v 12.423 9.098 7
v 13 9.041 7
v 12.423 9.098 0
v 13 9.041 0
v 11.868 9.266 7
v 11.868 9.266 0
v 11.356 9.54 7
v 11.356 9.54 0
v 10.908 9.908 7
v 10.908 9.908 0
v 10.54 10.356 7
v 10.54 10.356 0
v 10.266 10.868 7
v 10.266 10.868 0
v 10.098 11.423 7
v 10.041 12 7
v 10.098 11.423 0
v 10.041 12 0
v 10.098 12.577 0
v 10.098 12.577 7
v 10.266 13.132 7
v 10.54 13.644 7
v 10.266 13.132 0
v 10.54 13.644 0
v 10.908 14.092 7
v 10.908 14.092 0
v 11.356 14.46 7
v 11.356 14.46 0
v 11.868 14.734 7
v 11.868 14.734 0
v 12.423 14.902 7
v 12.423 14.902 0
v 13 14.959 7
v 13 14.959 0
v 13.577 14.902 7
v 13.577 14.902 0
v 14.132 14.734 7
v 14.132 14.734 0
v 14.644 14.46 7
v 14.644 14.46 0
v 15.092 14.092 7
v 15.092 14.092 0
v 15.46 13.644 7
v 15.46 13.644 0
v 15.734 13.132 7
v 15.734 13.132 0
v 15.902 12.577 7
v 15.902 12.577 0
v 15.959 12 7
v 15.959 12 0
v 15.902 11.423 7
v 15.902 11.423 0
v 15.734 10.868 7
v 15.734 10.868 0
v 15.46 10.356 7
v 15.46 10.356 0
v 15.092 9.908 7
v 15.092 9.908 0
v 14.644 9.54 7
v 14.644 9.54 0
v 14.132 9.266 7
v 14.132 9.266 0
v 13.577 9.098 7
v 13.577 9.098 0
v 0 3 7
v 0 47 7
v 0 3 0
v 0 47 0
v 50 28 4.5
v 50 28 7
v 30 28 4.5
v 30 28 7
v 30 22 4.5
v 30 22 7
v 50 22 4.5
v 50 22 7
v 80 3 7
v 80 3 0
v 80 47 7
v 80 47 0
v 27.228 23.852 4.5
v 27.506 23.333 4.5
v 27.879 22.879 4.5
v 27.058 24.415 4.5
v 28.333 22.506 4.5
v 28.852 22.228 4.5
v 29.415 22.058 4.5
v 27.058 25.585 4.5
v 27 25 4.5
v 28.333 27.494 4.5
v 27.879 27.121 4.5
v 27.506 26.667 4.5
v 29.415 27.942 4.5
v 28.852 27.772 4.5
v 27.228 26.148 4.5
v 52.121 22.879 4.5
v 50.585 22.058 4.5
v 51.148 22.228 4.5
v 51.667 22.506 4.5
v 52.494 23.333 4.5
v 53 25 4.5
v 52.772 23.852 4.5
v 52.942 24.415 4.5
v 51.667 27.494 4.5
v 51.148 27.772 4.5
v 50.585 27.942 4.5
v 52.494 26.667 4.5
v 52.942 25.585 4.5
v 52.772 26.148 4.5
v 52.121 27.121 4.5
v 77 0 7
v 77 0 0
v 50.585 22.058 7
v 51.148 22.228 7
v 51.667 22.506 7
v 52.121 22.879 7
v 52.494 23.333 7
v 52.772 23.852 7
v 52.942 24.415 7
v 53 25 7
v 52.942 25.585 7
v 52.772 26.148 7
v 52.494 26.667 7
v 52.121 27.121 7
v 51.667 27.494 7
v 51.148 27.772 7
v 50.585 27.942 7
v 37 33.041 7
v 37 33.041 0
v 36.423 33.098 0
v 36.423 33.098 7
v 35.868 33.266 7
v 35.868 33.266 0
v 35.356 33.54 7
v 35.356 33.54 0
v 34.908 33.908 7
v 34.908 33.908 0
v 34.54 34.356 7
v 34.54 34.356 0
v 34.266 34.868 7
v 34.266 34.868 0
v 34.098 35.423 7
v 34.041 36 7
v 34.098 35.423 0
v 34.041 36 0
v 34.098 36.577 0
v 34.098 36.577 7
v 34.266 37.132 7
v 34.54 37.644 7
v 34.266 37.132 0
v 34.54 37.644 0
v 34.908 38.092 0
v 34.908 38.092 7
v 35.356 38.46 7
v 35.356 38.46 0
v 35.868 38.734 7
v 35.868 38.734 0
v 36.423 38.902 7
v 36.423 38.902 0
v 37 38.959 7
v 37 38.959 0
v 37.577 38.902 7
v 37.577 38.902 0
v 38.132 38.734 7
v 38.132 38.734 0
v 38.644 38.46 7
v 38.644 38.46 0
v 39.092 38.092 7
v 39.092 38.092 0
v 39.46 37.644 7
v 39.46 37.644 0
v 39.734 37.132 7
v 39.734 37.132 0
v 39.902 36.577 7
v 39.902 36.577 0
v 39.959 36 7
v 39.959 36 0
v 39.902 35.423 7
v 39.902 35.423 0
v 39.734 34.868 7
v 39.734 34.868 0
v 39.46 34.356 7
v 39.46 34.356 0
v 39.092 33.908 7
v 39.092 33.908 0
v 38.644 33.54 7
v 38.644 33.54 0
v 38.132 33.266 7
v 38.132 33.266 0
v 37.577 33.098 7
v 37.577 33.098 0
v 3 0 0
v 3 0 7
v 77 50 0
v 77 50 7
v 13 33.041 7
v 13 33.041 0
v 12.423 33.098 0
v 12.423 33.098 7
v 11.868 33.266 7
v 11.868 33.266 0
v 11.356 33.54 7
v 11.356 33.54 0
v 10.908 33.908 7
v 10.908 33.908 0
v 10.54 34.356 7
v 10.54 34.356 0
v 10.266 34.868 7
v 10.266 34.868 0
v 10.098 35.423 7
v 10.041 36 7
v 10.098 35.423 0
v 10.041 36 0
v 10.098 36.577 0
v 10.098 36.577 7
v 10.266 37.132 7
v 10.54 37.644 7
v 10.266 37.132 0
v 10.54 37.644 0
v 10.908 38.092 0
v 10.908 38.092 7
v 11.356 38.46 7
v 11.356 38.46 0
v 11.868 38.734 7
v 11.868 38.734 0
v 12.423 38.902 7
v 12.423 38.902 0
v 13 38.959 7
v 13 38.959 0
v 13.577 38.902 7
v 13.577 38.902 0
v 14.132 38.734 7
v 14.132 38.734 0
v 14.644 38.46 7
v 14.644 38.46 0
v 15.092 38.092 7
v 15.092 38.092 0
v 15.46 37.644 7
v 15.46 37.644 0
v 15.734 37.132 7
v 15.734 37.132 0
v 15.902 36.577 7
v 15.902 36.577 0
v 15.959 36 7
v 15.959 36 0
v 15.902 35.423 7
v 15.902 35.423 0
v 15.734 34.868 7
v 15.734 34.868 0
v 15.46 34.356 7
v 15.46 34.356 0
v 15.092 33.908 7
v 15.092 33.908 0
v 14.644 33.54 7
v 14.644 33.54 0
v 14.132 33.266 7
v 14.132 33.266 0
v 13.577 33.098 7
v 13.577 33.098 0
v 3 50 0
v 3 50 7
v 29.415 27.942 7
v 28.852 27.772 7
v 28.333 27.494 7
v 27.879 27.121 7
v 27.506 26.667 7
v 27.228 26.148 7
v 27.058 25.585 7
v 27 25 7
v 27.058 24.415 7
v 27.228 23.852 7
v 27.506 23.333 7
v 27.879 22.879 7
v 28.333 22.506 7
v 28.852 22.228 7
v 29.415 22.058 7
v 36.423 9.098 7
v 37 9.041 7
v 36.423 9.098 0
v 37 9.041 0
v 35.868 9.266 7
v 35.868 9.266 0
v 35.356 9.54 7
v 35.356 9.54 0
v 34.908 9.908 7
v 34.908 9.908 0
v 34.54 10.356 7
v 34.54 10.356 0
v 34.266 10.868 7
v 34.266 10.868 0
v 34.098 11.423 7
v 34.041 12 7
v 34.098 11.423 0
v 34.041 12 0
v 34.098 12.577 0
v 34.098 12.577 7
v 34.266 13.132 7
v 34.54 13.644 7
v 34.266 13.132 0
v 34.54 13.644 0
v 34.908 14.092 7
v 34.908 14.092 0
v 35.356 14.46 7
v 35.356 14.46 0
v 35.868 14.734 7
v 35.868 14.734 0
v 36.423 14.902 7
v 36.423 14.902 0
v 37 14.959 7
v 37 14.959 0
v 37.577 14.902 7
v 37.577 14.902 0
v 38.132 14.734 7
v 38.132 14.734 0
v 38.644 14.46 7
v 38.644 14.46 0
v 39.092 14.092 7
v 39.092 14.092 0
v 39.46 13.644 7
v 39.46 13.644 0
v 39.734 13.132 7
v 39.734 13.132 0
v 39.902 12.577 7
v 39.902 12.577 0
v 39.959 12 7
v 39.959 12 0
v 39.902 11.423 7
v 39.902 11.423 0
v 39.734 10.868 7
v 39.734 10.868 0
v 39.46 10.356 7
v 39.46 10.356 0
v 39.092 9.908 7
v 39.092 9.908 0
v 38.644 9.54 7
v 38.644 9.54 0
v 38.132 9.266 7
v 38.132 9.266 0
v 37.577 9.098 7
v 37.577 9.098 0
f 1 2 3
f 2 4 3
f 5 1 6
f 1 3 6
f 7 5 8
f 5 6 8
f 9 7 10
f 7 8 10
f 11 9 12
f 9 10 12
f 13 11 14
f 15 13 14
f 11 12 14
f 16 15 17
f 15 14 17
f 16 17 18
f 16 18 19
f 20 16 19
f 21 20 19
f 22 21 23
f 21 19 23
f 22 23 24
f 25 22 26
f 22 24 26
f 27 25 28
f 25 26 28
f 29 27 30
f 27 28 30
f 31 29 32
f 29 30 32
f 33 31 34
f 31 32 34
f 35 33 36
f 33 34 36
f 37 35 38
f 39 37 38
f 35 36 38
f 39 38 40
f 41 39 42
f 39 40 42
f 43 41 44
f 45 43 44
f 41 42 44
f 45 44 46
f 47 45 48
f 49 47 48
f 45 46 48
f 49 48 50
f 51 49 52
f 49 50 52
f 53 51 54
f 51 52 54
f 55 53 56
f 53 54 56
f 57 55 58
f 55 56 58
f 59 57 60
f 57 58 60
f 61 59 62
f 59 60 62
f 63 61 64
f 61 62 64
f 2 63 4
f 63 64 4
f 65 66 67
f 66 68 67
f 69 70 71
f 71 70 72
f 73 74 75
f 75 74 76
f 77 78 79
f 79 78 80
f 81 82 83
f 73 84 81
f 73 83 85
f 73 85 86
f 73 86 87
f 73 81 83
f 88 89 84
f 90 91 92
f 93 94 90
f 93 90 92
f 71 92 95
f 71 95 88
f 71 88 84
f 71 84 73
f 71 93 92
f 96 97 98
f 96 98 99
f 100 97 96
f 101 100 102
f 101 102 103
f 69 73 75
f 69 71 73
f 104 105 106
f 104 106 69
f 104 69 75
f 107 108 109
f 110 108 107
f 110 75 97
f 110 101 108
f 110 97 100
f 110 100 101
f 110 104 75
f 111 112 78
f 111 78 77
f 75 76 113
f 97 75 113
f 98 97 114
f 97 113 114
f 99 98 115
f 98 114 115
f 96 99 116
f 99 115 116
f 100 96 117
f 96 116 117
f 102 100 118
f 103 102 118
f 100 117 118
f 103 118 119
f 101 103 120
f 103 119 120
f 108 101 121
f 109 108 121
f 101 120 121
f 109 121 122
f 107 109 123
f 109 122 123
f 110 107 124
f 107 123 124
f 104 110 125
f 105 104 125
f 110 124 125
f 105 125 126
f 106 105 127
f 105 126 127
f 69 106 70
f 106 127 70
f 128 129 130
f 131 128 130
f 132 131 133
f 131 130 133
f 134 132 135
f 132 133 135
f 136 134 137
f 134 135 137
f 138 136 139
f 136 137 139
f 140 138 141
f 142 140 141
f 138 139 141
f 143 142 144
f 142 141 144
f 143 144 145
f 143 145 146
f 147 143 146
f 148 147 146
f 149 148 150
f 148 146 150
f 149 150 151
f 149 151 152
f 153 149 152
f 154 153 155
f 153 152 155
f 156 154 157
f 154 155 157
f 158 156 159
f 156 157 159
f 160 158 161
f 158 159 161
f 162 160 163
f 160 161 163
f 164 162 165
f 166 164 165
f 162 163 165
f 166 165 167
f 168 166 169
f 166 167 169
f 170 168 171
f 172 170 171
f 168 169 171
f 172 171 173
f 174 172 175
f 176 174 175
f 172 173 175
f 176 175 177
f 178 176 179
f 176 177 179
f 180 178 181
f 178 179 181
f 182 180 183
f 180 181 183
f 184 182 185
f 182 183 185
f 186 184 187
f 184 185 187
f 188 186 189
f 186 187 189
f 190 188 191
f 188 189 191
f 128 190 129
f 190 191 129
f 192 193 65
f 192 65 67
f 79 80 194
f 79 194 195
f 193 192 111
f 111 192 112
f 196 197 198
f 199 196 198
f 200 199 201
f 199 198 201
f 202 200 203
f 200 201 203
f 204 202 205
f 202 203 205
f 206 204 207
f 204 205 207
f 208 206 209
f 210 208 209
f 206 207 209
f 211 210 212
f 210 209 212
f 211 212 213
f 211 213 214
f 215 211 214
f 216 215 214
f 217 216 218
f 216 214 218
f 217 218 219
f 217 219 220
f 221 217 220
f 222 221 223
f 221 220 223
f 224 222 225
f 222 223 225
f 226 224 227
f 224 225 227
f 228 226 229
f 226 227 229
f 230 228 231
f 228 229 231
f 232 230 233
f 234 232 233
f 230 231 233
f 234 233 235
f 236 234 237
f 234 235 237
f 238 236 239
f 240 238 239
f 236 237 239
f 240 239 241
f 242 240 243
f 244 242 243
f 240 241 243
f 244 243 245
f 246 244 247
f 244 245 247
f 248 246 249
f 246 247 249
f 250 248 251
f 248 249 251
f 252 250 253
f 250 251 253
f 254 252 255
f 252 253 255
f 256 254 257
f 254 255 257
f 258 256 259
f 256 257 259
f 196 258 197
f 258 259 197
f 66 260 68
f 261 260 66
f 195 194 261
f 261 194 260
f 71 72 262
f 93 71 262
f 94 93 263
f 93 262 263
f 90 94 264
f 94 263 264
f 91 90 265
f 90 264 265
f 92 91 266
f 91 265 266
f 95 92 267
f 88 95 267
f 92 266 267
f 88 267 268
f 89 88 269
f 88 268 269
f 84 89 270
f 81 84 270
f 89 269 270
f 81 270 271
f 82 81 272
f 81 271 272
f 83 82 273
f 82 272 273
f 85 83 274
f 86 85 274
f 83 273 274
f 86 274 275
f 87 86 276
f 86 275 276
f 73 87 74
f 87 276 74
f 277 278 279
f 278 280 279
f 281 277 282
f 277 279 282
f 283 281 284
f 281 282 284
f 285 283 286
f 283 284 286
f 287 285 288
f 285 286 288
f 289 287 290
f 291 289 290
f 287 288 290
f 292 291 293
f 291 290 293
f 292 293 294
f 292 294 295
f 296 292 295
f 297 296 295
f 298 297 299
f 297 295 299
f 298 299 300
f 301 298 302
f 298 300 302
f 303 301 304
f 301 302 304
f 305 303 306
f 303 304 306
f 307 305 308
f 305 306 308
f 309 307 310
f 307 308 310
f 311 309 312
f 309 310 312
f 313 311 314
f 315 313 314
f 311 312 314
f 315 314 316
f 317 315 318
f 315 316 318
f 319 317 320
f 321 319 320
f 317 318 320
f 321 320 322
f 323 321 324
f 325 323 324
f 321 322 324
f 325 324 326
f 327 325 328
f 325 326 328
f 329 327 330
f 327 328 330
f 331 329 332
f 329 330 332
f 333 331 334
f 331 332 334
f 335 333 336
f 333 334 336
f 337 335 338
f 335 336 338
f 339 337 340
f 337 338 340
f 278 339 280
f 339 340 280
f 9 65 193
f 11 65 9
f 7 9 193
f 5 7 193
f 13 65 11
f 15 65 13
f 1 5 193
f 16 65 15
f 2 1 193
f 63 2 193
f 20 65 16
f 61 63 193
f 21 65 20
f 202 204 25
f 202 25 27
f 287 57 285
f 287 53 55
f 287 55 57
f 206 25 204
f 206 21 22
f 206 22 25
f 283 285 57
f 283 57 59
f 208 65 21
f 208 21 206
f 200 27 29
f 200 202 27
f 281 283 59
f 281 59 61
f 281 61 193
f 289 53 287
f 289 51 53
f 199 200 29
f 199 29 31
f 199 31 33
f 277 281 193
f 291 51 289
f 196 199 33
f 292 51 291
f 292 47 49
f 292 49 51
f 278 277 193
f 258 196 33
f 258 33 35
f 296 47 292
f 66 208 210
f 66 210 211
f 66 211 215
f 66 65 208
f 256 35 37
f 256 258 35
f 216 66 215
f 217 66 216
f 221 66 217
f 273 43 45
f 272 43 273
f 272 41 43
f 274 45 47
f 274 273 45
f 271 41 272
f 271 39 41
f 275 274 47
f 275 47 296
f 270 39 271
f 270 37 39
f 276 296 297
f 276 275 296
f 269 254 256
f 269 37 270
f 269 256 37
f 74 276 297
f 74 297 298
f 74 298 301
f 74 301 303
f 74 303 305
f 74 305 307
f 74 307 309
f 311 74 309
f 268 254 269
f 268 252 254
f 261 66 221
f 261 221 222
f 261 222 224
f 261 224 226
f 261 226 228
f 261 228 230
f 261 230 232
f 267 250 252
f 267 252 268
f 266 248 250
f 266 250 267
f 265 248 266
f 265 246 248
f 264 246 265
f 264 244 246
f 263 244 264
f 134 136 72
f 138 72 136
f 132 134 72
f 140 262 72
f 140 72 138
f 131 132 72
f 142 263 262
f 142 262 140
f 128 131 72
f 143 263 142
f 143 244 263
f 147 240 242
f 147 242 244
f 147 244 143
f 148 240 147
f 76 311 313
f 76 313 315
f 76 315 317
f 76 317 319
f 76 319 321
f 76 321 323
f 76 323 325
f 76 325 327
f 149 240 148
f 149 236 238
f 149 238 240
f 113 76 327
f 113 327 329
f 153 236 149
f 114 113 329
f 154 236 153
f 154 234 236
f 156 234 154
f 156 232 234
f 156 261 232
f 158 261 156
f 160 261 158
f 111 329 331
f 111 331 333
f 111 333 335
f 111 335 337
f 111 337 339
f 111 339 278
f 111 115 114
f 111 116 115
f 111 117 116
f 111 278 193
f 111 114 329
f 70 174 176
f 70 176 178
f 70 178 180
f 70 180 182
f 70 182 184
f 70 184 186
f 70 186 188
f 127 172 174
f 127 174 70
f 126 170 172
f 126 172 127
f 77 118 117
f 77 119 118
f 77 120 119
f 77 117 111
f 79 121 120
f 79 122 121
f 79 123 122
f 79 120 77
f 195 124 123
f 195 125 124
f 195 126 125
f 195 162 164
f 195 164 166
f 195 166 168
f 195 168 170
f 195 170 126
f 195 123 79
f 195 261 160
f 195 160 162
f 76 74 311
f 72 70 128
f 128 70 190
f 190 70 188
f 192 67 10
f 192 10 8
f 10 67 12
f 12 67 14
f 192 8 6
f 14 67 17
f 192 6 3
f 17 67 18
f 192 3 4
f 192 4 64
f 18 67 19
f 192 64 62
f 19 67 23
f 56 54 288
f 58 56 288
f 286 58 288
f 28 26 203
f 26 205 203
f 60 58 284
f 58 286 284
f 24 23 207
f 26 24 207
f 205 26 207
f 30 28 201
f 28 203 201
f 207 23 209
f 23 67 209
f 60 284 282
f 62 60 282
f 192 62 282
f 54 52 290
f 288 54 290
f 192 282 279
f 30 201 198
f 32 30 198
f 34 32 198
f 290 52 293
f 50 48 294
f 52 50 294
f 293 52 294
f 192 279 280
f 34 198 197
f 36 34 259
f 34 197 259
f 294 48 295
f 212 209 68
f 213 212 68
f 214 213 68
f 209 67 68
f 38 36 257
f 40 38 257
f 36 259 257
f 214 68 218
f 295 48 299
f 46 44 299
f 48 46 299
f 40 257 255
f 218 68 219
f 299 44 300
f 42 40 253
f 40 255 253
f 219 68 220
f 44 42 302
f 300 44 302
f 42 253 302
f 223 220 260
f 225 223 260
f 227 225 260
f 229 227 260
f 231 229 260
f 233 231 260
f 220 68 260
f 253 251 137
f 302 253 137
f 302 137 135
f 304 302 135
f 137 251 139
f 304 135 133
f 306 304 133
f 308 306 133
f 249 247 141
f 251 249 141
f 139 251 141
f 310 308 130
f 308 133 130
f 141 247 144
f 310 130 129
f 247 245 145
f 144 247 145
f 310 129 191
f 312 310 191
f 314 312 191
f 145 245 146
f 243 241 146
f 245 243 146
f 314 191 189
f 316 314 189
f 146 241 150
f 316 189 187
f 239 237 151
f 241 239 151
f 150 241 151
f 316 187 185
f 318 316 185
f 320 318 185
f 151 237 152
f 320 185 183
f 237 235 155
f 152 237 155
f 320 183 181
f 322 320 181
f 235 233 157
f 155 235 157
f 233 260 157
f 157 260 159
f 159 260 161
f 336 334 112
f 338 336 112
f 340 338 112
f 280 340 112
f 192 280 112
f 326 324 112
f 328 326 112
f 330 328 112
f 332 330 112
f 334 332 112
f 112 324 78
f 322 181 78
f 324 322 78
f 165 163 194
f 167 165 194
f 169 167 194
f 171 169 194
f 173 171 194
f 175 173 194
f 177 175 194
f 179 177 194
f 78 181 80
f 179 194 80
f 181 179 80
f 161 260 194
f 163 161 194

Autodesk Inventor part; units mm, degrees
ref_plane "YZ Plane" through (0, 0, 0) normal (1, 0, 0) x (0, 1, 0)
ref_plane "XZ Plane" through (0, 0, 0) normal (0, 1, 0) x (-1, 0, 0)
ref_plane "XY Plane" through (0, 0, 0) normal (0, 0, 1) x (1, 0, 0)
sketch "Skizze1" plane through (0, 0, 0) normal (0, 0, 1) x (1, 0, 0)
  line L0 (0, 0) -> (80, 0)
  line L1 (80, 0) -> (80, 50)
  line L2 (80, 50) -> (0, 50)
  line L3 (0, 50) -> (0, 0)
  dimension "Breite" = 50
  dimension "Laenge" = 80
extrude "Extrusion1" add sketch "Skizze1" along normal blind 7
chamfer "Fasen1" distance 3 angle 45 4 edges at (80, 50, 3.5) (80, 0, 3.5) (0, 50, 3.5) (0, 0, 3.5)
sketch "Skizze2" plane through (0, 0, 7) normal (0, 0, 1) x (1, 0, 0)
  line L0 (77, 50) -> (3, 50) projected
  line L1 (40, 50) -> (40, 0) construction
  line L2 (0, 47) -> (0, 3) projected
  line L3 (0, 25) -> (80, 25) construction
  line L4 (80, 3) -> (80, 47) projected
  point P0 (0, 0)
  point P1 (13, 36)
  dimension "Punktabstand1" = 13
  dimension "Punktabstand2" = 14
hole "Bohrung1" at (13, 36, 7) direction (0, 0, -1) diameter 5.9175 end through all thread size "M7x1" class "6H" standard "ISO Metric profile"
sketch "Skizze3" plane through (0, 0, 7) normal (0, 0, 1) x (1, 0, 0)
  line L0 (30, 25) -> (50, 25) construction
  line L1 (30, 22) -> (50, 22)
  line L2 (50, 28) -> (30, 28)
  arc A0 (30, 28) -> (30, 22) centre (30, 25) ccw
  arc A1 (50, 22) -> (50, 28) centre (50, 25) ccw
  line L3 (3, 0) -> (77, 0) projected
  line L4 (0, 47) -> (0, 3) projected
  point P0 (0, 0)
  point P1 (40, 25)
  point P2 (40, 0)
  point P3 (0, 25)
  point P4 (40, 0)
  point P5 (0, 25)
  dimension "Mannlochbreite" = 6
  dimension "Mannlochlaenge" = 20
extrude "Extrusion2" cut sketch "Skizze3" against normal blind 2.5
pattern_linear "Rechteckige Anordnung2" count 2 spacing 24 along (0, -1, 0) count 2 spacing 24 along (1, 0, 0) of "Bohrung1"
equation "\"d27\" = Abstand_Zeilen"
equation "\"d30\" = Abstand_Zeilen"
equation "\"Abstand_Zeilen\" = Breite - 2 * Punktabstand1"
equation "\"Abstand_Spalten\" = Laenge - 2 * Punktabstand2"
properties part number "variante-03" material "Edelstahl"
